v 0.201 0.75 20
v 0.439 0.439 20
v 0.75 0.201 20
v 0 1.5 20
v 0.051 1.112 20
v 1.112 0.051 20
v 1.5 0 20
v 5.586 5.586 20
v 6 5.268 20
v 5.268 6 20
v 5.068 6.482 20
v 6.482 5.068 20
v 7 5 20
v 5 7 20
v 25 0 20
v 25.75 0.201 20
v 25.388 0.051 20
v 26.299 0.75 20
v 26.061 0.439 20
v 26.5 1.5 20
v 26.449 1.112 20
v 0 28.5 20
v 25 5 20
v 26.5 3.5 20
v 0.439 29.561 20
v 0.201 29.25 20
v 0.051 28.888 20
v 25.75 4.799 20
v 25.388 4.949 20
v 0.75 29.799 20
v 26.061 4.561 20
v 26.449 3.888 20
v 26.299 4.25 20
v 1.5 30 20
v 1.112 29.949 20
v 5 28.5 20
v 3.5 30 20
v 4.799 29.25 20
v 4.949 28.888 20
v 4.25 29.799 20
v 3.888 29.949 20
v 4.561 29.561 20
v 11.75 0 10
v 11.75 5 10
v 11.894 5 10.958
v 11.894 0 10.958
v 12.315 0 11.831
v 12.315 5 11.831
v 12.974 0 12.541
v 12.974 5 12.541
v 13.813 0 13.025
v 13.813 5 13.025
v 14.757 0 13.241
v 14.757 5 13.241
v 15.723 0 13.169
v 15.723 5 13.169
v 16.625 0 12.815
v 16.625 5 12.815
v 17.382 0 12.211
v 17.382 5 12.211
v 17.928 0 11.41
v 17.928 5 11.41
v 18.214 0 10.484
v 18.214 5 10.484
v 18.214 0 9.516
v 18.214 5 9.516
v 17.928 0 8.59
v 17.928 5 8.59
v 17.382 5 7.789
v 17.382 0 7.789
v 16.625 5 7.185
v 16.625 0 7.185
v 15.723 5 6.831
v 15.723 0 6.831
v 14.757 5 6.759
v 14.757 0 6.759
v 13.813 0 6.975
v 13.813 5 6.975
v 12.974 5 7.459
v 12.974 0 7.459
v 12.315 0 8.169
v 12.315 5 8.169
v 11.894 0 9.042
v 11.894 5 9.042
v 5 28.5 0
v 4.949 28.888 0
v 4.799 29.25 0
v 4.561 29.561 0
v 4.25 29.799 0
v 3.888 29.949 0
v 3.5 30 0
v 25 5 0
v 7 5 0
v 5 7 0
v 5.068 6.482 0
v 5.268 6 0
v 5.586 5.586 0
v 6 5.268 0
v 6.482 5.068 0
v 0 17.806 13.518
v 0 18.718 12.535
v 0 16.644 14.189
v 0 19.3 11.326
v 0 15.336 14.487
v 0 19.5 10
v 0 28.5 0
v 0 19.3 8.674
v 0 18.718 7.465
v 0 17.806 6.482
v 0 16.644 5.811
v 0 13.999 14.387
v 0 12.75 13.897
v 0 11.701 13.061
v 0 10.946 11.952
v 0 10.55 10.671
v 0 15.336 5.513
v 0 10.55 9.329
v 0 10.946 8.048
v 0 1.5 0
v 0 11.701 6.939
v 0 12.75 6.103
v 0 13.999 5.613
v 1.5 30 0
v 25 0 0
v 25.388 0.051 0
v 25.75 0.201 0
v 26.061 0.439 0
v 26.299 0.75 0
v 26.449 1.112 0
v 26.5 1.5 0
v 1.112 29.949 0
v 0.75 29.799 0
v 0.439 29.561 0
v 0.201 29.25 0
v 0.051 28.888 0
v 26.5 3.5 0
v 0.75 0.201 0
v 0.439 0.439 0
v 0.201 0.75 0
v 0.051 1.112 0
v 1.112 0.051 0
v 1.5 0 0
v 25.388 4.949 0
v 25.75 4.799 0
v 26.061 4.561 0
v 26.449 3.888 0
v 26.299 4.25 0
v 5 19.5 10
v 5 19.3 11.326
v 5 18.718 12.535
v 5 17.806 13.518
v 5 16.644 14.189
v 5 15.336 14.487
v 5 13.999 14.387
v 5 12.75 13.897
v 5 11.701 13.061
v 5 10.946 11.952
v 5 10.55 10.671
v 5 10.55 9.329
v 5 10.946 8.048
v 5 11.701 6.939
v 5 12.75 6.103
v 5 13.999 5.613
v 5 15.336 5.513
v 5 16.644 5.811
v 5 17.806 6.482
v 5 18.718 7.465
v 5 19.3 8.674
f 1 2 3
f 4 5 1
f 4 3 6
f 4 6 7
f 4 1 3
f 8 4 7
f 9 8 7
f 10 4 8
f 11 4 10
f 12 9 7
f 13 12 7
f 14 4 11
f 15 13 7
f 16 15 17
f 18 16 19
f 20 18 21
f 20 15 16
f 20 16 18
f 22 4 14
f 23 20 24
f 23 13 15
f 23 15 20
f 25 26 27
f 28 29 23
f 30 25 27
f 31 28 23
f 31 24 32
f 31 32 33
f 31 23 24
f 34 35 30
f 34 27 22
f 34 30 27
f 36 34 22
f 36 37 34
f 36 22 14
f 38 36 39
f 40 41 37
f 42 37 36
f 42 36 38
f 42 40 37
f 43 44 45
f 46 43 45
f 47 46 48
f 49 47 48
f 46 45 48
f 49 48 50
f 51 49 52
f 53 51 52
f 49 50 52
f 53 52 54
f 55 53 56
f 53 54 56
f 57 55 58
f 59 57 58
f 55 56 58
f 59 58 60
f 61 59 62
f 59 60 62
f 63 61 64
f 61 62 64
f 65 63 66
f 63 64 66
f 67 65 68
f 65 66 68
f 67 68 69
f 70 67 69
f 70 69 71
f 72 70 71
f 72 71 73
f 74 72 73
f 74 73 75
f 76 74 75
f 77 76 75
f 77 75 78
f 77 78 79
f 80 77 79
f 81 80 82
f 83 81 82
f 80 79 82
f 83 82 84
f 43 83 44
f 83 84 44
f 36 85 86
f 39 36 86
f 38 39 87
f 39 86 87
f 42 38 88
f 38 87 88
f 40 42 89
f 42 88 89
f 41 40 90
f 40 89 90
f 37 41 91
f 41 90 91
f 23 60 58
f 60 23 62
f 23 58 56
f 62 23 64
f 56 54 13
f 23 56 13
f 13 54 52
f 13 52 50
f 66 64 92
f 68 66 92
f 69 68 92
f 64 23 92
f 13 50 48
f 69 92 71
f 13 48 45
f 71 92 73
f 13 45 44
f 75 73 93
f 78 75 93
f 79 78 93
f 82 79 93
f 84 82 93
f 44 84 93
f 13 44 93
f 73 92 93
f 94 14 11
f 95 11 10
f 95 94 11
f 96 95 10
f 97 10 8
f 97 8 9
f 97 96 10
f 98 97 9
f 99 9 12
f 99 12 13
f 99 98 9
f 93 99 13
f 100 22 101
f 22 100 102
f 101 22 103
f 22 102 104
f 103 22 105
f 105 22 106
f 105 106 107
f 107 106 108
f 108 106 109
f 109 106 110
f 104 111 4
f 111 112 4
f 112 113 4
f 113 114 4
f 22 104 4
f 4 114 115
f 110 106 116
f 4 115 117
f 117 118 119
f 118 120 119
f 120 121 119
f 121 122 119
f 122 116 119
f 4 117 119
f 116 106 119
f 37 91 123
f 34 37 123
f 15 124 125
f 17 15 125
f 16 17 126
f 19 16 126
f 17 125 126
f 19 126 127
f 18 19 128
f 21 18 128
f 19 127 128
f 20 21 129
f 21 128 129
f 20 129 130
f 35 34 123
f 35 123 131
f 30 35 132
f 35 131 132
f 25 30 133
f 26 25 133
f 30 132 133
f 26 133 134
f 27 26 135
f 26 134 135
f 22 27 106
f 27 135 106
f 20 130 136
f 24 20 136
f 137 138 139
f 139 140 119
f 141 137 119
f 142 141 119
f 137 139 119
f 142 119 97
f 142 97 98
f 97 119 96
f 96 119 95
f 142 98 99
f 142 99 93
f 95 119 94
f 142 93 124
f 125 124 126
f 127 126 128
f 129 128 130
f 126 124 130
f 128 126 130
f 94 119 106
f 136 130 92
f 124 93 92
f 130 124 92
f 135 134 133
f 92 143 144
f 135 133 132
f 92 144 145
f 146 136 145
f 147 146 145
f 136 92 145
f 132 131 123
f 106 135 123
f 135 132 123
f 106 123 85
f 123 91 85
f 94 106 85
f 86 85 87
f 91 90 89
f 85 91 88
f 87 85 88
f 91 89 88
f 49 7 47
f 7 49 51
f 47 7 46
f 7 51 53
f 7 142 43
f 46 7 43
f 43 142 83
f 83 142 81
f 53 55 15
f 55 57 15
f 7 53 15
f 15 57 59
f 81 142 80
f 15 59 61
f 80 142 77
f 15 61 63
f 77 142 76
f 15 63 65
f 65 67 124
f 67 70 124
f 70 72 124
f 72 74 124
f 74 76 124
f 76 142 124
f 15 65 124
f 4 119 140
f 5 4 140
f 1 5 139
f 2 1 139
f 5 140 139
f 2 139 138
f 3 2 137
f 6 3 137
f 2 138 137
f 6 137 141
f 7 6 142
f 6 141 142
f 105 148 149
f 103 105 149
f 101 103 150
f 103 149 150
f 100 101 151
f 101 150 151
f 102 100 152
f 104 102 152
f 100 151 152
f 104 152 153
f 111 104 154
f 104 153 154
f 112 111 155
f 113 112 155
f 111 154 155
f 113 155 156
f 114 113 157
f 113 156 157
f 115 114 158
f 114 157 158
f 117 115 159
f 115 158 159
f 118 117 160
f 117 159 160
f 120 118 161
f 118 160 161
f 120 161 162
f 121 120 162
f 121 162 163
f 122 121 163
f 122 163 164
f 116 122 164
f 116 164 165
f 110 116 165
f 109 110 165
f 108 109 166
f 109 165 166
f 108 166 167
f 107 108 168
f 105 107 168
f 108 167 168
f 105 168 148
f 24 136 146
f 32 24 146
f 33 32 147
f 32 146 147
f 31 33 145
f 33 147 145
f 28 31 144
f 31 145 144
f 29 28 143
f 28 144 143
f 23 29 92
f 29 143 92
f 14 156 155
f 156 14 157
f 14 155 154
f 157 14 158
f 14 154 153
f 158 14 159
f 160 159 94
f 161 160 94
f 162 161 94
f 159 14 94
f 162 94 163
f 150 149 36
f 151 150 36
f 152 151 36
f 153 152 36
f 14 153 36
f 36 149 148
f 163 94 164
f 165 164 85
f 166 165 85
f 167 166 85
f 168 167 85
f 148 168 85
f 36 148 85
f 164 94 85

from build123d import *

# Parameters (mm, degrees)
PAD_DEPTH       = 20
SKETCH001_R     = 4.5
POCKET_DEPTH    = 5
SKETCH002_R     = 3.25
POCKET001_DEPTH = 5


with BuildPart() as part:
    # Sketch → Pad (new body)
    with BuildSketch(Plane.XY):
        with BuildLine():
            Line((0, 28.5), (0, 1.5))
            ThreePointArc((0, 1.5), (0.43934, 0.43934), (1.5, 0))
            Line((1.5, 0), (25, 0))
            ThreePointArc((25, 0), (26.06066, 0.43934), (26.5, 1.5))
            Line((26.5, 1.5), (26.5, 3.5))
            ThreePointArc((26.5, 3.5), (26.06066, 4.56066), (25, 5))
            Line((25, 5), (7, 5))
            ThreePointArc((5, 7), (5.585786, 5.585786), (7, 5))
            Line((5, 7), (5, 28.5))
            ThreePointArc((5, 28.5), (4.56066, 29.56066), (3.5, 30))
            Line((3.5, 30), (1.5, 30))
            ThreePointArc((1.5, 30), (0.43934, 29.56066), (0, 28.5))
        make_face()
    extrude(amount=PAD_DEPTH)

    # Sketch001 (on Face1 of Pad) → Pocket (cut)
    with BuildSketch(Plane.YZ.offset(5)):
        with Locations((15, 10)):
            Circle(SKETCH001_R)
    extrude(amount=-POCKET_DEPTH, mode=Mode.SUBTRACT)

    # Sketch002 (on Face7 of Pocket) → Pocket001 (cut)
    with BuildSketch(Plane(origin=(0, 5, 0), x_dir=(-1, 0, 0), z_dir=(0, 1, 0))):
        with Locations((-15, 10)):
            Circle(SKETCH002_R)
    extrude(amount=-POCKET001_DEPTH, mode=Mode.SUBTRACT)


solid = part.part
